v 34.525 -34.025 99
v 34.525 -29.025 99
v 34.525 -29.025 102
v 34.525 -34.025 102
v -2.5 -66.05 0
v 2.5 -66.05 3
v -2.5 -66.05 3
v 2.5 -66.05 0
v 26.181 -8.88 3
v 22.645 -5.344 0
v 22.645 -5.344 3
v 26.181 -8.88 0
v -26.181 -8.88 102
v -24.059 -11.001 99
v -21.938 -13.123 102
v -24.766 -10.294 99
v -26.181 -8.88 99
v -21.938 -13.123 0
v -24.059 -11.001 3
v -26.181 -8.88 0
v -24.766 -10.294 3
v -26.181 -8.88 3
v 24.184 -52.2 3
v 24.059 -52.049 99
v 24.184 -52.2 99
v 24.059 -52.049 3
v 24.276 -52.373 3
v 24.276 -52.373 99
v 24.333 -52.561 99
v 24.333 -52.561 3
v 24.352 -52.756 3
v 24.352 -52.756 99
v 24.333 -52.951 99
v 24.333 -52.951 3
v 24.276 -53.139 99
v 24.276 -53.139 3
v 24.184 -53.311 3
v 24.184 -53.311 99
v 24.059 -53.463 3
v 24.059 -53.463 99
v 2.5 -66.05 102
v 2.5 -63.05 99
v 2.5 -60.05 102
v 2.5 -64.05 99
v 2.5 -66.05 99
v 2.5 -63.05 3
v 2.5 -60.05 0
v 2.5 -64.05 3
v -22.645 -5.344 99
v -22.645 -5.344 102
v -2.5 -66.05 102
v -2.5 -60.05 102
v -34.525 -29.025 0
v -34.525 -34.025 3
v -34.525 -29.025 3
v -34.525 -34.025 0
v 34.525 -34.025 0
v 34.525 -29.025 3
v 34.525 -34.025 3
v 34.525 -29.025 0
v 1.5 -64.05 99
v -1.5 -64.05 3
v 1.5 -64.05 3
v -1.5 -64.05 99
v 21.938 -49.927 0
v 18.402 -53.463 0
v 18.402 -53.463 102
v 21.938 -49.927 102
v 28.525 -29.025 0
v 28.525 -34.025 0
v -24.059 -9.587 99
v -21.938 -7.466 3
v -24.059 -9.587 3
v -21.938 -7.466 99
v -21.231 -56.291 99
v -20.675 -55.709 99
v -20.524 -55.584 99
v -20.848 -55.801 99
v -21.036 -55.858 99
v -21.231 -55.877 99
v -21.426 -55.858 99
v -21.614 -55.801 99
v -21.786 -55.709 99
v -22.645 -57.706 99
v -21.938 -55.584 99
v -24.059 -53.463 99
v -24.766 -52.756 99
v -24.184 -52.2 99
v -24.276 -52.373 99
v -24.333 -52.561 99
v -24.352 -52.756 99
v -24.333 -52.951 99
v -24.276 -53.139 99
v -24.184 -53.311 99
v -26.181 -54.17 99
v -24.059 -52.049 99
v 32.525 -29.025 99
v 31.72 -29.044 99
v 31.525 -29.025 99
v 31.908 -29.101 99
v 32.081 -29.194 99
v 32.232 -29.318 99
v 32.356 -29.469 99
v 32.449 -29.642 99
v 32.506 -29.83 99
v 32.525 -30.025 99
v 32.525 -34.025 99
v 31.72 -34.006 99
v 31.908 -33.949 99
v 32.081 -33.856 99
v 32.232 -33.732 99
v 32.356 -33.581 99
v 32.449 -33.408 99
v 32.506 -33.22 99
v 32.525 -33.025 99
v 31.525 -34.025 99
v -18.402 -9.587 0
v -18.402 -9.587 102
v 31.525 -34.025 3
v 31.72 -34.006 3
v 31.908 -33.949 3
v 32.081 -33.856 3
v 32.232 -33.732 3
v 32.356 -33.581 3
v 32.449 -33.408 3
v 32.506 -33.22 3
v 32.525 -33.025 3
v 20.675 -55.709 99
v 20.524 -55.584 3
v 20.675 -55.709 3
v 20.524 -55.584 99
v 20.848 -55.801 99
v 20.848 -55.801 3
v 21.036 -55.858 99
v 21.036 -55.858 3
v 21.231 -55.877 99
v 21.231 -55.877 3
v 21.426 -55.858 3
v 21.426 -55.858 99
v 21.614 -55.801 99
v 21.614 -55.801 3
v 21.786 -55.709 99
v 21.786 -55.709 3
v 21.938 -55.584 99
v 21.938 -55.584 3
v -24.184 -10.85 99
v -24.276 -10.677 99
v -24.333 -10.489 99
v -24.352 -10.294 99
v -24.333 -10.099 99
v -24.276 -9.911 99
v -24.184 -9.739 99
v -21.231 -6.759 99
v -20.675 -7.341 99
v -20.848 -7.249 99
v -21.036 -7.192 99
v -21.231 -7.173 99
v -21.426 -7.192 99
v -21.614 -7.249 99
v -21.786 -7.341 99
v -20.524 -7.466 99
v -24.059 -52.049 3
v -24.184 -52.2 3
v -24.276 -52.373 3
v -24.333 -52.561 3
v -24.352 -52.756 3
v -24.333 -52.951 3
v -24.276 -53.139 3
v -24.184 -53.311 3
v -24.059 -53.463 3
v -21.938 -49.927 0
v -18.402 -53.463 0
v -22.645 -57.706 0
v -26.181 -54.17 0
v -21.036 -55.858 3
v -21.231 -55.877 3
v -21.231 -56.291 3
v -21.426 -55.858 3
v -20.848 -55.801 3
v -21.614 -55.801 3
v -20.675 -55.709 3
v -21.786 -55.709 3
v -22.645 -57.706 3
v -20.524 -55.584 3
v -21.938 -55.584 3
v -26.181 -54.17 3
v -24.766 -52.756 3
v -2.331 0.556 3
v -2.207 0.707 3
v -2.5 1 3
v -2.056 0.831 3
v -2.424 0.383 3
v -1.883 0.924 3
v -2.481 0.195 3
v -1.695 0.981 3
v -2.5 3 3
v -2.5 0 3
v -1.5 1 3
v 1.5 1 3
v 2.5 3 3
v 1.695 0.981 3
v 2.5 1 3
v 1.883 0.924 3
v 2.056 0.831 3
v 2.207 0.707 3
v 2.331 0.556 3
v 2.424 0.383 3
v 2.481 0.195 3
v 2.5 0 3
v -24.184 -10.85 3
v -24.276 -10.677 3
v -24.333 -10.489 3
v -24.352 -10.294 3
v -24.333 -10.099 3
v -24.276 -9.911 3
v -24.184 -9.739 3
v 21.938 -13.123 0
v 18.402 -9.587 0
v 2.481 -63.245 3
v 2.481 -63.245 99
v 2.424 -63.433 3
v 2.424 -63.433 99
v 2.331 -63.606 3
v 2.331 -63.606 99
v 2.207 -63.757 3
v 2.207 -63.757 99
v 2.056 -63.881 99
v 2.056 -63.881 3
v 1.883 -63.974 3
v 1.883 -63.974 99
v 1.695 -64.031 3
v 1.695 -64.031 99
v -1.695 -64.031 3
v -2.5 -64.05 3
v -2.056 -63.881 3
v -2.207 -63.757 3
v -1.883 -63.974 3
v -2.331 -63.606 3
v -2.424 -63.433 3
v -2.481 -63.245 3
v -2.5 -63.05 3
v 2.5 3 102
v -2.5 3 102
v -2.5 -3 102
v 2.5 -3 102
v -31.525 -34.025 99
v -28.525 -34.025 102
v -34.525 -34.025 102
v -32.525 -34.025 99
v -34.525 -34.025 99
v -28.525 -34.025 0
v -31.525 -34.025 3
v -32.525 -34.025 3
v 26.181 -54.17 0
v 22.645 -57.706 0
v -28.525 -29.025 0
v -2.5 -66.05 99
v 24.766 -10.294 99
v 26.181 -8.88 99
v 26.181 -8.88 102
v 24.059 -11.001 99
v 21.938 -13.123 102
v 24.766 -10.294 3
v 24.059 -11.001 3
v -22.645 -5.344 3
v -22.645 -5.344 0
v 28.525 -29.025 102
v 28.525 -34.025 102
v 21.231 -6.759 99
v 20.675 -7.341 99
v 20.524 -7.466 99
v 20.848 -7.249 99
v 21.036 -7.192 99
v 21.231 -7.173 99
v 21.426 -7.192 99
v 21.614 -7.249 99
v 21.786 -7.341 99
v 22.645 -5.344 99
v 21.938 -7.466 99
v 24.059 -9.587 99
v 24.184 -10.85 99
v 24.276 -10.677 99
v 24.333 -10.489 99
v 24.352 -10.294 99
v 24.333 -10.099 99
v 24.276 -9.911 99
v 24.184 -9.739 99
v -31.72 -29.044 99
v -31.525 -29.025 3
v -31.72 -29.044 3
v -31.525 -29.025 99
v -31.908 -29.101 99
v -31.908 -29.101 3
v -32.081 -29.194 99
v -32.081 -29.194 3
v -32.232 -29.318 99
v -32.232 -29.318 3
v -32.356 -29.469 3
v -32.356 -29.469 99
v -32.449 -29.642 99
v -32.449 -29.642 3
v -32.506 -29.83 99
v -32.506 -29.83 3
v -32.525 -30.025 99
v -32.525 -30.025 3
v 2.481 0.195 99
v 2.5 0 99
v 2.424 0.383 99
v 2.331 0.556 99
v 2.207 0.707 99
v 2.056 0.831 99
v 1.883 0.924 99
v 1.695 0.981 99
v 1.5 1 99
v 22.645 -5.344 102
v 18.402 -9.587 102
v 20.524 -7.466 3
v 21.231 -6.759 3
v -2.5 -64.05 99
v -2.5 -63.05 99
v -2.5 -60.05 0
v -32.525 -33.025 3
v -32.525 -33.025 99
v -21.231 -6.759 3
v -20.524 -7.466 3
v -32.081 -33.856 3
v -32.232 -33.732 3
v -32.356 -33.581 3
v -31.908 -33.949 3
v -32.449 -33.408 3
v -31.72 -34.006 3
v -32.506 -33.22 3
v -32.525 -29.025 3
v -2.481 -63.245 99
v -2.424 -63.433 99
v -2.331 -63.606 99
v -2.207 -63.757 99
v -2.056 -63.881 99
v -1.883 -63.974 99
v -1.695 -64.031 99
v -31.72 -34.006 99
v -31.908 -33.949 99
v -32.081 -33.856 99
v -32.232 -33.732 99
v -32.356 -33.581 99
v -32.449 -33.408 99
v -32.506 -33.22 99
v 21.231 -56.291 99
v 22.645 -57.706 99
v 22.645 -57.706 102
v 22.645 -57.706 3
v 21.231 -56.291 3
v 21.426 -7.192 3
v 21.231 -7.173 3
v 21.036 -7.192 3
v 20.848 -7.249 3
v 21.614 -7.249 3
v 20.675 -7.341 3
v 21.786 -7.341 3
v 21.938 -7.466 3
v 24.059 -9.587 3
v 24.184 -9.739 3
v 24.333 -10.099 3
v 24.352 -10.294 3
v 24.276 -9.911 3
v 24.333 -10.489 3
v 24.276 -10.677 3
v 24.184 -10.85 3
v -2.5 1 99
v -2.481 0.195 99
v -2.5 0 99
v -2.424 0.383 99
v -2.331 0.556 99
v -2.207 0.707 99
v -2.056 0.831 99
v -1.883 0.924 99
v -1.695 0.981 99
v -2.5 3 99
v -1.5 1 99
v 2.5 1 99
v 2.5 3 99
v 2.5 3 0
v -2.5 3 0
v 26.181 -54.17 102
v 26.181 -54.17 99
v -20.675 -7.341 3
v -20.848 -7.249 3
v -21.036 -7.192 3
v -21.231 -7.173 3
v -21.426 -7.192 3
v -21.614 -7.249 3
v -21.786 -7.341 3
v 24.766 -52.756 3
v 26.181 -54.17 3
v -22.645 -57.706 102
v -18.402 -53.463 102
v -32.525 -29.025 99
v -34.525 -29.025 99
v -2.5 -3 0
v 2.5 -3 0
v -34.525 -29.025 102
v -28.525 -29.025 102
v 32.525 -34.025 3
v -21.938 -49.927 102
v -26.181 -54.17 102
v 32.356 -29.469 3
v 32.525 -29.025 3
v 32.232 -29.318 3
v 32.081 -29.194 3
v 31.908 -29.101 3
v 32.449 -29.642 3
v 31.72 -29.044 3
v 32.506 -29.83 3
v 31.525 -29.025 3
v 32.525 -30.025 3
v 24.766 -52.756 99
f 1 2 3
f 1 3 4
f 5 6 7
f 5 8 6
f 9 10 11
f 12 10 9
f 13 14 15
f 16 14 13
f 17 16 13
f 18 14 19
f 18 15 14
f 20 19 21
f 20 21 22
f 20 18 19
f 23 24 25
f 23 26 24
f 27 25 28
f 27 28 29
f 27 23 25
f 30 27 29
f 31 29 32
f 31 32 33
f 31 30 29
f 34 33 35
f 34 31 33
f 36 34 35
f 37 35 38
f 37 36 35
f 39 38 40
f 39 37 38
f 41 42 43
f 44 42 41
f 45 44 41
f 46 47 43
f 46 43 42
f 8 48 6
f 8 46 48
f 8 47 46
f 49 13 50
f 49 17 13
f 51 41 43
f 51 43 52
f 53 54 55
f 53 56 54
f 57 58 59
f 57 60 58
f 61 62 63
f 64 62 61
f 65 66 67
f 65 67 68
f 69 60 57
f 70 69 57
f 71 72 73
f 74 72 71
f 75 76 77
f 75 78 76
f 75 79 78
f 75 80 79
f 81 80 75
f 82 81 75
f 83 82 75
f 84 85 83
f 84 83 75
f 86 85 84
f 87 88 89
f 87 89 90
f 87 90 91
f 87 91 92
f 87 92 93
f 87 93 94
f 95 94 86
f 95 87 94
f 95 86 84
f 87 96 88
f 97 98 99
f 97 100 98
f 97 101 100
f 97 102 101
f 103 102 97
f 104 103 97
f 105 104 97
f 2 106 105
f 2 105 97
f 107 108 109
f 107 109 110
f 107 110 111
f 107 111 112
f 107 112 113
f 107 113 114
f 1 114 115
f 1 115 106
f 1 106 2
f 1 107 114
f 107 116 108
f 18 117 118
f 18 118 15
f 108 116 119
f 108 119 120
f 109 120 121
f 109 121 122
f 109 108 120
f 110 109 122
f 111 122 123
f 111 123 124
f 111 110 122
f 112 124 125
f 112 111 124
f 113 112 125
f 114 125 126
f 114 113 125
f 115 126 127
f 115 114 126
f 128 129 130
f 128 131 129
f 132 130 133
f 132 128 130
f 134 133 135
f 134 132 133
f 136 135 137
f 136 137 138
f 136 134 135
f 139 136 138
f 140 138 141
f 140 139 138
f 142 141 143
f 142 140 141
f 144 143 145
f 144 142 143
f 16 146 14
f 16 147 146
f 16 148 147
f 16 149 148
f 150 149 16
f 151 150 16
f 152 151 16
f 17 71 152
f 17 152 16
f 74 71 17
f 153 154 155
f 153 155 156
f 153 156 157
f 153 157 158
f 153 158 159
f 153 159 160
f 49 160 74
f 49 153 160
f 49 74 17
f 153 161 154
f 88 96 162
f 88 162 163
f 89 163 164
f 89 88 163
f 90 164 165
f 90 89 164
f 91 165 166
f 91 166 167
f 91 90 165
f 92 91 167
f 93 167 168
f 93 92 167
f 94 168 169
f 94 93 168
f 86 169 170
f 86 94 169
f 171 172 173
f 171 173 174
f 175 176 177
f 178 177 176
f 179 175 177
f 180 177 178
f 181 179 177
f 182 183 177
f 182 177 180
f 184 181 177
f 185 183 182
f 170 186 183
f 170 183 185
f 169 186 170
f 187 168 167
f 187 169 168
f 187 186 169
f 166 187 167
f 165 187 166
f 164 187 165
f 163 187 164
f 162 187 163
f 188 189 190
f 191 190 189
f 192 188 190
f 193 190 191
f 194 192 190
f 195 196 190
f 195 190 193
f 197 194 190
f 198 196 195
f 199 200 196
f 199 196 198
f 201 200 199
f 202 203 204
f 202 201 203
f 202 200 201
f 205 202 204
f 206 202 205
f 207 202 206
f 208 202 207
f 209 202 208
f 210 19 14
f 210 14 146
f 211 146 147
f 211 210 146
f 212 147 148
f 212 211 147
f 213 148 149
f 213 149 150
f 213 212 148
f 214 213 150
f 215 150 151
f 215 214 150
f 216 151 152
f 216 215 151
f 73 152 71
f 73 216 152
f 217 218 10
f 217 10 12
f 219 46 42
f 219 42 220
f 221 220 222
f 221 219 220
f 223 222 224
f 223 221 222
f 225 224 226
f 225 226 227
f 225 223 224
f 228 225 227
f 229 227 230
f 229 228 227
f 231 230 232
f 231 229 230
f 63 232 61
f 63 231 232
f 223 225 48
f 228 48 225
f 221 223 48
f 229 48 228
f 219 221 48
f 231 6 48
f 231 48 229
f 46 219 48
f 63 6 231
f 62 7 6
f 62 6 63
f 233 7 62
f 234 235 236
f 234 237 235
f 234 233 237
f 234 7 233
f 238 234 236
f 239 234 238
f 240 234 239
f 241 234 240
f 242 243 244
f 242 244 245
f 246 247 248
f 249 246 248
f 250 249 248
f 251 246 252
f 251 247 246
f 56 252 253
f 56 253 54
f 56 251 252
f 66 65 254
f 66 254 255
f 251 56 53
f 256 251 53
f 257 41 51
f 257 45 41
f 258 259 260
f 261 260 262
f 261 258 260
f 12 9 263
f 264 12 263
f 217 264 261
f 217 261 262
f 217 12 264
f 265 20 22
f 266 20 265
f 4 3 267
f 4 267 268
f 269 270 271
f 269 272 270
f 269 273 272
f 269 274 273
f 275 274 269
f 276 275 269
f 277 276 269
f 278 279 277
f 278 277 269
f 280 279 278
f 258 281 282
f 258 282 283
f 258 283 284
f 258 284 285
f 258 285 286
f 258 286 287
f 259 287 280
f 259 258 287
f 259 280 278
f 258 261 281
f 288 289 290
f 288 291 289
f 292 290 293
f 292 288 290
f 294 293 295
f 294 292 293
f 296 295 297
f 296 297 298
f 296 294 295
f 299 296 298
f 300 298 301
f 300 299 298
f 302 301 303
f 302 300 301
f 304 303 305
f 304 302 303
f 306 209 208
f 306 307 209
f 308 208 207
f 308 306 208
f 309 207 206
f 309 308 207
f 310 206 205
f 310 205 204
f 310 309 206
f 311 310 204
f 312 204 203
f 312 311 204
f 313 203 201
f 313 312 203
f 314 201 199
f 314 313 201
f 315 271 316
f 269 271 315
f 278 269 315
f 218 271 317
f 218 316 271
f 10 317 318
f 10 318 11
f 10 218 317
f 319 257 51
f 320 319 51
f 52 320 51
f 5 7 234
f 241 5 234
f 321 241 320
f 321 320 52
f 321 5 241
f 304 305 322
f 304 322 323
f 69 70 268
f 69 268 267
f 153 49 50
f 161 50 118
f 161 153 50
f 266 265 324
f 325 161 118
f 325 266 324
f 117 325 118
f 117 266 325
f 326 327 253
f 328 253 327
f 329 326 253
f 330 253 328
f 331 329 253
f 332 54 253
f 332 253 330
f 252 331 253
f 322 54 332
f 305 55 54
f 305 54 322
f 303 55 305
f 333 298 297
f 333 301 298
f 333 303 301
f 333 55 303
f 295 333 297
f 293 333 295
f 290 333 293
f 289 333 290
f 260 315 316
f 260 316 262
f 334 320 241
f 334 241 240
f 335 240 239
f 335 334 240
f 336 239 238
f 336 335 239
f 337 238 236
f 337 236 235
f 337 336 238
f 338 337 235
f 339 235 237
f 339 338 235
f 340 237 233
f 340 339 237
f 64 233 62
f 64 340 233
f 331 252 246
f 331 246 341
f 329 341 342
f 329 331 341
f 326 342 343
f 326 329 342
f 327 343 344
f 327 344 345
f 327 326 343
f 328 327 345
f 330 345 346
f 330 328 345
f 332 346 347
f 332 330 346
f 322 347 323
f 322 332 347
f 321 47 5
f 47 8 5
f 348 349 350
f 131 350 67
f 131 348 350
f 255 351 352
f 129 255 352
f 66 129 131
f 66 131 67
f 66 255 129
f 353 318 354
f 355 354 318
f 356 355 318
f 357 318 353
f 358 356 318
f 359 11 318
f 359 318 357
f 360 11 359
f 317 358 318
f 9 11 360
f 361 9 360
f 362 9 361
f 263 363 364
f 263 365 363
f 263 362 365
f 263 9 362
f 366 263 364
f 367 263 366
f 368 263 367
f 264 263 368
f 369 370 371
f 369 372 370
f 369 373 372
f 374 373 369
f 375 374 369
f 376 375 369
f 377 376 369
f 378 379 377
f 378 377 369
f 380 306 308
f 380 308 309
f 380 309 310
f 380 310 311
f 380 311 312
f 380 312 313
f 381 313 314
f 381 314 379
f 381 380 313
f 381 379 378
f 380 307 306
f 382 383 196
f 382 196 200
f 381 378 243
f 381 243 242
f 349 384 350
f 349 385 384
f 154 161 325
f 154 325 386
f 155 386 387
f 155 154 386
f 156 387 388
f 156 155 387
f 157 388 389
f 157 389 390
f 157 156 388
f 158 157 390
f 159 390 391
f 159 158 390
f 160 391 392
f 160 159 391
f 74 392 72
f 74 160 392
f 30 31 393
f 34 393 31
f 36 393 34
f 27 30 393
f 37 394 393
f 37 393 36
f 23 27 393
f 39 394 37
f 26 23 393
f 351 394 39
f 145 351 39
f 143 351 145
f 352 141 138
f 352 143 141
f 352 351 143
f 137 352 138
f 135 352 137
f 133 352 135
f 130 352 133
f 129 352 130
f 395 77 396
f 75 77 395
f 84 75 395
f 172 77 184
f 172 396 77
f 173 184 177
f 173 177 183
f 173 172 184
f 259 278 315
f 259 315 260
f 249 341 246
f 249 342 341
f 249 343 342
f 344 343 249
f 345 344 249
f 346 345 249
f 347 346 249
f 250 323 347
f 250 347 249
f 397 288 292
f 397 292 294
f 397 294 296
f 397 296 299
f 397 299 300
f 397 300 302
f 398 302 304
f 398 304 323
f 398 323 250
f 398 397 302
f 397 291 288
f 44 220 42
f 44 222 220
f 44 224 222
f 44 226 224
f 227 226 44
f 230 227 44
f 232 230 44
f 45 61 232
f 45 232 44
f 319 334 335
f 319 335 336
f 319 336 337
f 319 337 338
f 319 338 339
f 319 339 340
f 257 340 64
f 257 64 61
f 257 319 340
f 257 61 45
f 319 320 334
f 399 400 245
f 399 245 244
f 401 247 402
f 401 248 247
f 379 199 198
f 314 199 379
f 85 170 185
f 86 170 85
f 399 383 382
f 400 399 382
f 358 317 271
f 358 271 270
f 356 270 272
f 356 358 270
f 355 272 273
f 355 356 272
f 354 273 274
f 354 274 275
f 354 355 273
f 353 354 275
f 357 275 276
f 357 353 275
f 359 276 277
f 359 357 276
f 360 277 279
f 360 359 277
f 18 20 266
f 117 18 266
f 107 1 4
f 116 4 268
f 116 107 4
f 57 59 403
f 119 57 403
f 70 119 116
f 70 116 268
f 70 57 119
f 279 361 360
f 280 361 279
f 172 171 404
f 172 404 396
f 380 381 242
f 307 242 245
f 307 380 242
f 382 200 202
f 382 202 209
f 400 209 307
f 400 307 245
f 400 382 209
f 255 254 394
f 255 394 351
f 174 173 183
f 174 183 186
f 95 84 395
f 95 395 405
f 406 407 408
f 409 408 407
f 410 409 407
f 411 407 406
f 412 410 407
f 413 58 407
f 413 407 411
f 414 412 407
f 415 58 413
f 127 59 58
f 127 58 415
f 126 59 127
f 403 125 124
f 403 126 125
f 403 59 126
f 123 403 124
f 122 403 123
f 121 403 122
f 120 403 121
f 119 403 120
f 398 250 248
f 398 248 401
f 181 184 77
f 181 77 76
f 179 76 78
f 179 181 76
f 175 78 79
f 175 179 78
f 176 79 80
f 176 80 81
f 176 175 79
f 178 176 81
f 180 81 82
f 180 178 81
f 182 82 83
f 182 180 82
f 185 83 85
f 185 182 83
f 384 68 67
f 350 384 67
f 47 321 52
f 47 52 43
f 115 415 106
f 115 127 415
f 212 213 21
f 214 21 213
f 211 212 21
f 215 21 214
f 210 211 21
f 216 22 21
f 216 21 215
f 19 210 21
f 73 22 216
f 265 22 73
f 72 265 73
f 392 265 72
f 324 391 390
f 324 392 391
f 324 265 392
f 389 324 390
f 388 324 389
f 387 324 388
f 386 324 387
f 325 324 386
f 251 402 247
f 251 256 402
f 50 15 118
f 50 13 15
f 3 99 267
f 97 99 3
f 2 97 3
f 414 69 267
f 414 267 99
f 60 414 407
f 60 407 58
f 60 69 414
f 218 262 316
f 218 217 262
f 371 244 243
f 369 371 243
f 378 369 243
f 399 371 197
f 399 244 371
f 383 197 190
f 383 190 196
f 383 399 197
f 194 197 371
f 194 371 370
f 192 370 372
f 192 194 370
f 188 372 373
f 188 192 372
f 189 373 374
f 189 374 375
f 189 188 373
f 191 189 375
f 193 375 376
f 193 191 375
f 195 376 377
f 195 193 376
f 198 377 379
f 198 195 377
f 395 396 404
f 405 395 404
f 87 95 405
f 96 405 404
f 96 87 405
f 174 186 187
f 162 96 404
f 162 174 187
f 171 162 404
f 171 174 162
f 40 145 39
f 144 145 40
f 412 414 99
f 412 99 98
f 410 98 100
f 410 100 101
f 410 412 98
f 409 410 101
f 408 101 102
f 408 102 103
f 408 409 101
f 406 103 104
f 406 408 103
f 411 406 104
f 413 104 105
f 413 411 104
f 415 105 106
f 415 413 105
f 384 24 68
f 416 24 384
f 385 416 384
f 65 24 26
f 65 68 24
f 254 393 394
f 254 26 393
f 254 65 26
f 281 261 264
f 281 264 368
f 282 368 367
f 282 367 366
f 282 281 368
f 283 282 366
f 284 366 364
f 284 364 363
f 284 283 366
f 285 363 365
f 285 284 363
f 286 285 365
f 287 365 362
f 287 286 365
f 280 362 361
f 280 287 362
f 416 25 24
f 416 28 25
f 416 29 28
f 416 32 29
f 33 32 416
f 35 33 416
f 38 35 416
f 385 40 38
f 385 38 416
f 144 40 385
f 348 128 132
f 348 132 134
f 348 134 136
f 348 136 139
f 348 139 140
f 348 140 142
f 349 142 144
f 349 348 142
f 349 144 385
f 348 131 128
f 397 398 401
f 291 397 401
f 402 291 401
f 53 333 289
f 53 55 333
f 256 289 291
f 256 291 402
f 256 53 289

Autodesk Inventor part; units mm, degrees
ref_plane "YZ Plane" through (0, 0, 0) normal (1, 0, 0) x (0, 1, 0)
ref_plane "XZ Plane" through (0, 0, 0) normal (0, 1, 0) x (-1, 0, 0)
ref_plane "XY Plane" through (0, 0, 0) normal (0, 0, 1) x (1, 0, 0)
sketch "Sketch1" plane through (0, 0, 0) normal (0, 0, 1) x (1, 0, 0)
  line L0 (-2.5, 3) -> (2.5, 3)
  line L1 (2.5, 3) -> (2.5, -3)
  line L2 (2.5, -3) -> (-2.5, -3)
  line L3 (-2.5, -3) -> (-2.5, 3)
  point P0 (0, 0)
  dimension "d0" = 5
  dimension "d1" = 6
  dimension "d2" = 3
  dimension "d3" = 2.5
extrude "Extrusion1" add sketch "Sketch1" along normal blind 102
sketch "Sketch2" plane through (2.5, -3, 0) normal (1, 0, 0) x (0, 0, -1)
  line L0 (0, 6) -> (-102, 6) projected
  line L1 (-99, 6) -> (-3, 6)
  line L2 (-3, 6) -> (-3, 4)
  line L3 (-3, 4) -> (-99, 4)
  line L4 (-99, 4) -> (-99, 6)
  point P0 (0, 3)
  point P1 (-3, 6)
  dimension "d6" = 3
  dimension "d7" = 96
  dimension "d8" = 2
extrude "Extrusion2" cut sketch "Sketch2" against normal through all
fillet "Fillet1" radius 1 2 edges at (2.5, 1, 51) (-2.5, 1, 51)
sketch3d "3D Sketch1"
pattern_circular "Circular Pattern1" count 8 over 360 about axis through (0, -31.525, 102) along (0, 0, -1) of "Extrusion1", "Extrusion2", "Fillet1"
sketch "Sketch3" plane through (0, 0, 0) normal (0, 0, 1) x (1, 0, 0)
  line L0 (0, 0) -> (0, -31.525)
  line L1 (-2.5, -66.05) -> (2.5, -66.05) projected
  line L2 (2.5, 3) -> (-2.5, 3) projected
  dimension "d17" = 69.05
  dimension "d18" = 3
  dimension "d19" = 31.525
equation "\"d2\" = 0.5 * d1"
equation "\"d3\" = 0.5 * d0"
equation "\"d19\" = 0.5 * d17 - d18"
properties part number "1402_Bias Coil Spacer_V1" material "ABS Plastic"
